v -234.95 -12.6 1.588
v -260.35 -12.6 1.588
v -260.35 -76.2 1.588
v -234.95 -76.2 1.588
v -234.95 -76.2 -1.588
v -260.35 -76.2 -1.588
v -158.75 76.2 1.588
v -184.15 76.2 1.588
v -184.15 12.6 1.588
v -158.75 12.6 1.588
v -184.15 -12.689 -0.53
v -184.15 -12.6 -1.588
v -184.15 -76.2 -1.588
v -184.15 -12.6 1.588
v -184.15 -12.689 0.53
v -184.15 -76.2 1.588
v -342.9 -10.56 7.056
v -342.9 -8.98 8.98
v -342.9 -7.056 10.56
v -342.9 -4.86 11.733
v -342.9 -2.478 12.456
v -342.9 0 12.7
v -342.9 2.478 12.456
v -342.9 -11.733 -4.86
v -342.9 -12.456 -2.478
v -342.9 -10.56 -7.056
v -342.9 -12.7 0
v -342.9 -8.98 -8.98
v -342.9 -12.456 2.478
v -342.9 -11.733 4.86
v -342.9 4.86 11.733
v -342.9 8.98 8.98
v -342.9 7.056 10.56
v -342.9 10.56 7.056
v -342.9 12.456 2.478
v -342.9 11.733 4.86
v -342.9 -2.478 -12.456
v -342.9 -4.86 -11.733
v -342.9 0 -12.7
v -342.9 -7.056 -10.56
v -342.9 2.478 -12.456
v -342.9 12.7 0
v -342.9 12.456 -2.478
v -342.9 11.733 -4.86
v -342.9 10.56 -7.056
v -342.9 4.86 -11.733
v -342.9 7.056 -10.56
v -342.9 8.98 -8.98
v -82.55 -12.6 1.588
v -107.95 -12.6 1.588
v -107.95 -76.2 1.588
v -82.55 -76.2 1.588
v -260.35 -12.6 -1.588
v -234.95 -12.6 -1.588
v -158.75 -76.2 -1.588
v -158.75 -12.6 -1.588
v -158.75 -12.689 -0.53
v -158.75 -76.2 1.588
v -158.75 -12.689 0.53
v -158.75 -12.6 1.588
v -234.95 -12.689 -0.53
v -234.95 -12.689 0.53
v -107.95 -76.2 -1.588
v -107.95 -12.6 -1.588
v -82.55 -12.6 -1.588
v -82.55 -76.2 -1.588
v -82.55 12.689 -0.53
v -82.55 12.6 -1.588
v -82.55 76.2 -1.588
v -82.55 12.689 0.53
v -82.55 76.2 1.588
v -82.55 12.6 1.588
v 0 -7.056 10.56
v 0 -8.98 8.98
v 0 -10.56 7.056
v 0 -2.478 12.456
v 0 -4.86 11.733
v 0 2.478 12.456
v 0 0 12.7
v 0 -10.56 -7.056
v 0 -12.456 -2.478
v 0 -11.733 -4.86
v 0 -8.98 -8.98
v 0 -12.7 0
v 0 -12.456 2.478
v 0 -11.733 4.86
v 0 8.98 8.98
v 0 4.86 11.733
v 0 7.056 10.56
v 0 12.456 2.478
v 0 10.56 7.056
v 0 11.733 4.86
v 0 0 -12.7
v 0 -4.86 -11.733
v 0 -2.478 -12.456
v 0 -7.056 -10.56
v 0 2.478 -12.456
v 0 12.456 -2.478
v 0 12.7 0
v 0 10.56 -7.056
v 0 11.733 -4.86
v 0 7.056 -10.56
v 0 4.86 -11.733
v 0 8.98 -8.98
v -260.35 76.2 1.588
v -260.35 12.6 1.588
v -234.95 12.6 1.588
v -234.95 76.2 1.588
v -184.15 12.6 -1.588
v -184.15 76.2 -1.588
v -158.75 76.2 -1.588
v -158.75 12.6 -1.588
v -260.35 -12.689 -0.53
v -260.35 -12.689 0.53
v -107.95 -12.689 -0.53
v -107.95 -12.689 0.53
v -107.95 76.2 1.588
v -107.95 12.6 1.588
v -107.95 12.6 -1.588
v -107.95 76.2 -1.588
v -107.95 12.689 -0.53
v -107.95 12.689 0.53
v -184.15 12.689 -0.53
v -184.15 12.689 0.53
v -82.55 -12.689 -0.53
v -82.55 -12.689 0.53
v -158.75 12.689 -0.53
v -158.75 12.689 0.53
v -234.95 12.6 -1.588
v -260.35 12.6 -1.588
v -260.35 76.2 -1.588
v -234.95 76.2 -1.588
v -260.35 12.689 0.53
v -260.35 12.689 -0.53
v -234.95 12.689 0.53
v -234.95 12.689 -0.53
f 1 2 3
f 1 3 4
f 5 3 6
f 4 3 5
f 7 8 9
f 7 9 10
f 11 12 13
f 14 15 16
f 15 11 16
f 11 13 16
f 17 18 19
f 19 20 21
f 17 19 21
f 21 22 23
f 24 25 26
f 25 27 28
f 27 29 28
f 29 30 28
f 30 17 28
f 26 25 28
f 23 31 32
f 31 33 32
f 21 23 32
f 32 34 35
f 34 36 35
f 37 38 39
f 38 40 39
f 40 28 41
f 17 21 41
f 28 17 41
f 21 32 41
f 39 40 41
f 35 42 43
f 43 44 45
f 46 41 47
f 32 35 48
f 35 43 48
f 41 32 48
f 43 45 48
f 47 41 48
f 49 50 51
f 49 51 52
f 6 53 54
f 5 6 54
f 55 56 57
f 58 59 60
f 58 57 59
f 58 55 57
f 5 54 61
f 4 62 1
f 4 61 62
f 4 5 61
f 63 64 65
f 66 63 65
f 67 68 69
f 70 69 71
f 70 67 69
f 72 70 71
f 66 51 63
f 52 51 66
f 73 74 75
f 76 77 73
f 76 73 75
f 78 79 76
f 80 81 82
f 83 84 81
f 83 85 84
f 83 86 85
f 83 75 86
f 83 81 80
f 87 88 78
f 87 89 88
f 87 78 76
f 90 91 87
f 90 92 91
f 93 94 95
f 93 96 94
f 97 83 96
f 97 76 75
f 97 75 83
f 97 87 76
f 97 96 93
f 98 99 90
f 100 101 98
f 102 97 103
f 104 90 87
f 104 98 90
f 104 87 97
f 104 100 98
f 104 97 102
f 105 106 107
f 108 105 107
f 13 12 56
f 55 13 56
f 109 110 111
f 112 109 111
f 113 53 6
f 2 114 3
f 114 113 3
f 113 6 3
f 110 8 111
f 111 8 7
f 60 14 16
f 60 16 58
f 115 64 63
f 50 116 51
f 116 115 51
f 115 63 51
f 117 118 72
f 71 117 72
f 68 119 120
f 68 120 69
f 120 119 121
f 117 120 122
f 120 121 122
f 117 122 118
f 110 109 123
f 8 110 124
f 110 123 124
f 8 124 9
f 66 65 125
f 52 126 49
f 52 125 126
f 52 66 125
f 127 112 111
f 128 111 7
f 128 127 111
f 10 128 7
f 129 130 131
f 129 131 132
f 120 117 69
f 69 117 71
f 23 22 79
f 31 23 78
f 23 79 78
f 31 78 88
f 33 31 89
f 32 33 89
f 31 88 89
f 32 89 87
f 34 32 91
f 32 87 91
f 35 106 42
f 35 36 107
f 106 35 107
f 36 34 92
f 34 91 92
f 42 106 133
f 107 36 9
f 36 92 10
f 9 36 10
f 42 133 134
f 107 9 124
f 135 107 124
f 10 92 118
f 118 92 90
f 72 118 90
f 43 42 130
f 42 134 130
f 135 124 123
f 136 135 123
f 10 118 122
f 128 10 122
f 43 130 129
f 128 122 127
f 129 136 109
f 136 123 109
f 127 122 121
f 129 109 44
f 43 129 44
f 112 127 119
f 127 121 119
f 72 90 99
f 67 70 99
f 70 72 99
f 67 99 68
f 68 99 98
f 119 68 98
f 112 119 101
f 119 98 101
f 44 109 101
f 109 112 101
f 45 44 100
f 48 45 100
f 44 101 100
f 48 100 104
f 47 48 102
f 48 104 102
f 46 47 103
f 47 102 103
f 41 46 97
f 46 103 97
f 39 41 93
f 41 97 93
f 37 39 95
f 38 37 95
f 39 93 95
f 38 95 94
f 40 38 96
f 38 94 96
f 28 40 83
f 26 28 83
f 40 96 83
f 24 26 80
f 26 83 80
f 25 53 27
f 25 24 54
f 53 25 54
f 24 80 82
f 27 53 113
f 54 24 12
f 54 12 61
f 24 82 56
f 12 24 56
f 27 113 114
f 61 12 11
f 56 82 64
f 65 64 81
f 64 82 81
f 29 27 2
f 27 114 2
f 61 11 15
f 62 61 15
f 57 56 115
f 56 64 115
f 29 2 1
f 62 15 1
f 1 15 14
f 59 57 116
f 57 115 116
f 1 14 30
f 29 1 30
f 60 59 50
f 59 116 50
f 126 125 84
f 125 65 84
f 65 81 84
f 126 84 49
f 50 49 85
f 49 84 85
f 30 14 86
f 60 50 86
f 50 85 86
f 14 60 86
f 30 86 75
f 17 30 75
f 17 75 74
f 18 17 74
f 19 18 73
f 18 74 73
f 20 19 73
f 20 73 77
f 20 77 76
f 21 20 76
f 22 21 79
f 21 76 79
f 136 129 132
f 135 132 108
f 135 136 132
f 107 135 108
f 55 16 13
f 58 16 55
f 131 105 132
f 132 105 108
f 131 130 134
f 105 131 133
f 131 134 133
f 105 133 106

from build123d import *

# Parameters (mm, degrees)
F1_W     = 25.4
F1_H     = 3.175
F4_DEPTH = 76.2
F2_W     = 25.4
F2_H     = 3.175
F3_W     = 25.4
F3_H     = 3.175
F0_W     = 342.9
F0_H     = 12.7


with BuildPart() as f4:
    # F1 (on face) → F4 (new body, symmetric)
    with BuildSketch(Plane.XZ):
        with Locations((-247.65, 0)):
            Rectangle(F1_W, F1_H)
    extrude(amount=F4_DEPTH, both=True)



with BuildPart() as f4b:
    # F2 (on face) → F4, piece 2 (new body, symmetric)
    with BuildSketch(Plane.XZ):
        with Locations((-171.45, 0)):
            Rectangle(F2_W, F2_H)
    extrude(amount=F4_DEPTH, both=True)


with BuildPart() as f4c:
    # F3 (on face) → F4, piece 3 (new body, symmetric)
    with BuildSketch(Plane.XZ):
        with Locations((-95.25, 0)):
            Rectangle(F3_W, F3_H)
    extrude(amount=F4_DEPTH, both=True)


with BuildPart() as f4_1:
    add(f4.part)

    add(f4b.part)  # F5 merges F4b

    add(f4c.part)  # F5 merges F4c
    # F0 (on Front) → F5 (revolve)
    with BuildSketch(Plane.XZ):
        with Locations((-171.45, 6.35)):
            Rectangle(F0_W, F0_H)
    revolve(axis=Axis((-171.45, 0, 0), (-1, 0, 0)))


solid = f4_1.part
